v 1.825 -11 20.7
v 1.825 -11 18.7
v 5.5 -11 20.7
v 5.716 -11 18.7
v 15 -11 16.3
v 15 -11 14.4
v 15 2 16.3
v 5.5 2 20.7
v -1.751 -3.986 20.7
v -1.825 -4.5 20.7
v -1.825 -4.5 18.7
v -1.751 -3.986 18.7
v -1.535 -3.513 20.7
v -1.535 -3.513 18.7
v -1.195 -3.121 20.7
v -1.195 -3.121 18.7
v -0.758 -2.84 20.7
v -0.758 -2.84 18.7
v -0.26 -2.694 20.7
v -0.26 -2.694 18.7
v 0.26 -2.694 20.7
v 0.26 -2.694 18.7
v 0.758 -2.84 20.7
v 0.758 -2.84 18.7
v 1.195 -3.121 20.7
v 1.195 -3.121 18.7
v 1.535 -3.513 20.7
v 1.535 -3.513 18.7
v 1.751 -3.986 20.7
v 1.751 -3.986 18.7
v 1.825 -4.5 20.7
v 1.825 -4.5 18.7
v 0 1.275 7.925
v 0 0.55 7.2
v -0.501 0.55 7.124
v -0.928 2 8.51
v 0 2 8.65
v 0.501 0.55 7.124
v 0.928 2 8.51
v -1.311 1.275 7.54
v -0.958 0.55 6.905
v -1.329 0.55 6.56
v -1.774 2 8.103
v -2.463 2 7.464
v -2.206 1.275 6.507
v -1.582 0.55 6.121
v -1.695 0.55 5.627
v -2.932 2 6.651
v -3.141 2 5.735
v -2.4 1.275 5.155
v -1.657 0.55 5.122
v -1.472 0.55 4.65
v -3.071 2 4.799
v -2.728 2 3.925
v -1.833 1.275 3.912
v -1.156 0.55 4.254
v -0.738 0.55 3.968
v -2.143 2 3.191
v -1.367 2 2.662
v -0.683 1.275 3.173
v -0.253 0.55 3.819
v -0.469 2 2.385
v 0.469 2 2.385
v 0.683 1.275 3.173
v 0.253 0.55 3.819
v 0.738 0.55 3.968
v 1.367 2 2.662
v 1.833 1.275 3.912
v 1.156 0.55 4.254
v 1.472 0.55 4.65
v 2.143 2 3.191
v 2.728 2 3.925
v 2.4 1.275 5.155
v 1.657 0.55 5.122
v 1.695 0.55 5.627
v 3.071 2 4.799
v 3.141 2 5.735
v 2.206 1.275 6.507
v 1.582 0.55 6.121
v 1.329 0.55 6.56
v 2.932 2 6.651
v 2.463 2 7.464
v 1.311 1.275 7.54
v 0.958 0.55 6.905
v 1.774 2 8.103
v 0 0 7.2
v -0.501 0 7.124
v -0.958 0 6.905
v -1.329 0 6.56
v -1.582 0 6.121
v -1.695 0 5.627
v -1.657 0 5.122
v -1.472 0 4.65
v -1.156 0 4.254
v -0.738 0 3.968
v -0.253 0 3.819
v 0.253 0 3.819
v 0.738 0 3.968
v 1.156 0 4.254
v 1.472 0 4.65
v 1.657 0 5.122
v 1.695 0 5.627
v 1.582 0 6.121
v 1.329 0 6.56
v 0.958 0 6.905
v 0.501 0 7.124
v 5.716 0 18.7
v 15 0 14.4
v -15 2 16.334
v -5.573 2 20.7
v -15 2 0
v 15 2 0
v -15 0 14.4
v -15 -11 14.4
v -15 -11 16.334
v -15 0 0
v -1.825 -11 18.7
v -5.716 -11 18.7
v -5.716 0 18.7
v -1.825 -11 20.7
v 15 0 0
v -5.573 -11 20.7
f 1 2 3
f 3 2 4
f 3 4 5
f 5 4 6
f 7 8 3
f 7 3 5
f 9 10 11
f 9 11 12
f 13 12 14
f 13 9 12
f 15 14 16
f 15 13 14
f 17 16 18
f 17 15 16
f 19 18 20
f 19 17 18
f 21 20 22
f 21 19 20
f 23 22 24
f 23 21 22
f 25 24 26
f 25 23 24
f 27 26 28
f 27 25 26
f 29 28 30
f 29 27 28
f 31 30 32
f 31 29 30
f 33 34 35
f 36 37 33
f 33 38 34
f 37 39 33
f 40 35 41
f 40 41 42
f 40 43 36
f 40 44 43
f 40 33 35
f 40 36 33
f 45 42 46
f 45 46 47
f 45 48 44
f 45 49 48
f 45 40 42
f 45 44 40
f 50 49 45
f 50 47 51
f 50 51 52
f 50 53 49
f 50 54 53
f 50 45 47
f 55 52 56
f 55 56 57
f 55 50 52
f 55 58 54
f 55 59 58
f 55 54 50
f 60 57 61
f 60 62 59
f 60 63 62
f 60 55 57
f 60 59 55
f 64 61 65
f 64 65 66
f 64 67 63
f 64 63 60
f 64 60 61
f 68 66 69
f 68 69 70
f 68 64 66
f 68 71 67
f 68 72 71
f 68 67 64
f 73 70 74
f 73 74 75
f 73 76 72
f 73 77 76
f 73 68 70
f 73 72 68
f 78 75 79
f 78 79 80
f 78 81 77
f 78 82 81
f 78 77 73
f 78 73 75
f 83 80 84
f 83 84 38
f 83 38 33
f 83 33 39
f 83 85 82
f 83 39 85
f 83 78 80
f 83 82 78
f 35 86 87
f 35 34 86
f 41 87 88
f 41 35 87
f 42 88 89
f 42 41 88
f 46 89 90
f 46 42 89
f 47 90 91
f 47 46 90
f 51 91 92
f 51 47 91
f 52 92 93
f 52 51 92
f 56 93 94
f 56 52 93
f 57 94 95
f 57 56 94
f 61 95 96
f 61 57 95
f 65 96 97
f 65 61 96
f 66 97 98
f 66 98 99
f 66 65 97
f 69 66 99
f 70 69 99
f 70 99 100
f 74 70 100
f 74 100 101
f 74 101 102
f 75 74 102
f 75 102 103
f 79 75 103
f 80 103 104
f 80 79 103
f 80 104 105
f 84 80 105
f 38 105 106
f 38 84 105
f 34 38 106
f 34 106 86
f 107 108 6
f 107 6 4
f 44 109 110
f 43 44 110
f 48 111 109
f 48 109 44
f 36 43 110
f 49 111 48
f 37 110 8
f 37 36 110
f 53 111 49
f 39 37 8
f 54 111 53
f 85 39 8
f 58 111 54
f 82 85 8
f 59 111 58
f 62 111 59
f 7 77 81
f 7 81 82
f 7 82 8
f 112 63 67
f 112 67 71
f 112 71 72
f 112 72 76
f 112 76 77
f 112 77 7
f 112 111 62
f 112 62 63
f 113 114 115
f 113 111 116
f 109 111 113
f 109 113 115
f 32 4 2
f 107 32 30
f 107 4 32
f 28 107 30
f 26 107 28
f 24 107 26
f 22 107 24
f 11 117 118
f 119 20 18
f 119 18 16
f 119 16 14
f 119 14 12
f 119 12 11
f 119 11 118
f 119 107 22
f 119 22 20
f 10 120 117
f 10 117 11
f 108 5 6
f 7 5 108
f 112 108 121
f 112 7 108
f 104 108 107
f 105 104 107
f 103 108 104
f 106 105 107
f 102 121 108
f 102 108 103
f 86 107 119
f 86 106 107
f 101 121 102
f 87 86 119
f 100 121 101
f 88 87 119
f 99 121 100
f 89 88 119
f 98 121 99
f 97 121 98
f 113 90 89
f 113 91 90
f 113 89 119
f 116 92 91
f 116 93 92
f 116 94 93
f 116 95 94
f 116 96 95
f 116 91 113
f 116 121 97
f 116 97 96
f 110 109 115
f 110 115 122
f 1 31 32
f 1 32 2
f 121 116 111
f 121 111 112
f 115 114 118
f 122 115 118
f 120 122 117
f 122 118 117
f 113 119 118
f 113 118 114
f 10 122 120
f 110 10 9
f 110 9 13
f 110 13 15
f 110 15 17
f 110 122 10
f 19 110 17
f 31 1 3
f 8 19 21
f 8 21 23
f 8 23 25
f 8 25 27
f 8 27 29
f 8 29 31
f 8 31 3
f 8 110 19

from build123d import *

# Parameters (mm, degrees)
BOSS_EXTRUDE1_DEPTH = 2
BOSS_EXTRUDE2_DEPTH = 13
CUT_EXTRUDE1_DEPTH  = 7


with BuildPart() as part:
    # Sketch1 → Boss-Extrude1 (new body)
    with BuildSketch(Plane(origin=(0, 0, 0), x_dir=(1, 0, 0), z_dir=(0, 1, 0))):
        Polygon((-15, -14.4), (-15, 0), (15, 0), (15, -14.4), (5.71590909, -18.700000004), (-5.71590909, -18.700000004), align=None)
    extrude(amount=BOSS_EXTRUDE1_DEPTH)

    # Sketch3 → CSK for M3 Flat Head Machine Screw1 (revolve, cut)
    with BuildSketch(Plane(origin=(0, 2, 5.5), x_dir=(0, 0, 1), z_dir=(1, 0, 0))):
        Polygon((0, 0), (0, 2), (1.7, 2), (1.7, 1.45), (3.15, 0), align=None)
    revolve(axis=Axis((0, 8.35, 5.5), (0, -1, 0)), mode=Mode.SUBTRACT)

    # Sketch4 → Boss-Extrude2 (add)
    with BuildSketch(Plane(origin=(0, 2, 0), x_dir=(1, 0, 0), z_dir=(0, 1, 0))):
        Polygon((-15, -14.4), (-15, -16.33369736), (-5.572755662, -20.700000004), (5.5, -20.700000004), (15, -16.3), (15, -14.4), (5.71590909, -18.700000004), (-5.71590909, -18.700000004), align=None)
    extrude(amount=-BOSS_EXTRUDE2_DEPTH)

    # Sketch5 → Cut-Extrude1 (cut)
    with BuildSketch(Plane.XY.offset(20.700000004)):
        with BuildLine():
            Line((1.825, -4.5), (1.825, -11))
            ThreePointArc((1.825, -11), (0, -12.825), (-1.825, -11))
            Line((-1.825, -11), (-1.825, -4.5))
            ThreePointArc((-1.825, -4.5), (0, -2.675), (1.825, -4.5))
        make_face()
    extrude(amount=-CUT_EXTRUDE1_DEPTH, mode=Mode.SUBTRACT)


solid = part.part
